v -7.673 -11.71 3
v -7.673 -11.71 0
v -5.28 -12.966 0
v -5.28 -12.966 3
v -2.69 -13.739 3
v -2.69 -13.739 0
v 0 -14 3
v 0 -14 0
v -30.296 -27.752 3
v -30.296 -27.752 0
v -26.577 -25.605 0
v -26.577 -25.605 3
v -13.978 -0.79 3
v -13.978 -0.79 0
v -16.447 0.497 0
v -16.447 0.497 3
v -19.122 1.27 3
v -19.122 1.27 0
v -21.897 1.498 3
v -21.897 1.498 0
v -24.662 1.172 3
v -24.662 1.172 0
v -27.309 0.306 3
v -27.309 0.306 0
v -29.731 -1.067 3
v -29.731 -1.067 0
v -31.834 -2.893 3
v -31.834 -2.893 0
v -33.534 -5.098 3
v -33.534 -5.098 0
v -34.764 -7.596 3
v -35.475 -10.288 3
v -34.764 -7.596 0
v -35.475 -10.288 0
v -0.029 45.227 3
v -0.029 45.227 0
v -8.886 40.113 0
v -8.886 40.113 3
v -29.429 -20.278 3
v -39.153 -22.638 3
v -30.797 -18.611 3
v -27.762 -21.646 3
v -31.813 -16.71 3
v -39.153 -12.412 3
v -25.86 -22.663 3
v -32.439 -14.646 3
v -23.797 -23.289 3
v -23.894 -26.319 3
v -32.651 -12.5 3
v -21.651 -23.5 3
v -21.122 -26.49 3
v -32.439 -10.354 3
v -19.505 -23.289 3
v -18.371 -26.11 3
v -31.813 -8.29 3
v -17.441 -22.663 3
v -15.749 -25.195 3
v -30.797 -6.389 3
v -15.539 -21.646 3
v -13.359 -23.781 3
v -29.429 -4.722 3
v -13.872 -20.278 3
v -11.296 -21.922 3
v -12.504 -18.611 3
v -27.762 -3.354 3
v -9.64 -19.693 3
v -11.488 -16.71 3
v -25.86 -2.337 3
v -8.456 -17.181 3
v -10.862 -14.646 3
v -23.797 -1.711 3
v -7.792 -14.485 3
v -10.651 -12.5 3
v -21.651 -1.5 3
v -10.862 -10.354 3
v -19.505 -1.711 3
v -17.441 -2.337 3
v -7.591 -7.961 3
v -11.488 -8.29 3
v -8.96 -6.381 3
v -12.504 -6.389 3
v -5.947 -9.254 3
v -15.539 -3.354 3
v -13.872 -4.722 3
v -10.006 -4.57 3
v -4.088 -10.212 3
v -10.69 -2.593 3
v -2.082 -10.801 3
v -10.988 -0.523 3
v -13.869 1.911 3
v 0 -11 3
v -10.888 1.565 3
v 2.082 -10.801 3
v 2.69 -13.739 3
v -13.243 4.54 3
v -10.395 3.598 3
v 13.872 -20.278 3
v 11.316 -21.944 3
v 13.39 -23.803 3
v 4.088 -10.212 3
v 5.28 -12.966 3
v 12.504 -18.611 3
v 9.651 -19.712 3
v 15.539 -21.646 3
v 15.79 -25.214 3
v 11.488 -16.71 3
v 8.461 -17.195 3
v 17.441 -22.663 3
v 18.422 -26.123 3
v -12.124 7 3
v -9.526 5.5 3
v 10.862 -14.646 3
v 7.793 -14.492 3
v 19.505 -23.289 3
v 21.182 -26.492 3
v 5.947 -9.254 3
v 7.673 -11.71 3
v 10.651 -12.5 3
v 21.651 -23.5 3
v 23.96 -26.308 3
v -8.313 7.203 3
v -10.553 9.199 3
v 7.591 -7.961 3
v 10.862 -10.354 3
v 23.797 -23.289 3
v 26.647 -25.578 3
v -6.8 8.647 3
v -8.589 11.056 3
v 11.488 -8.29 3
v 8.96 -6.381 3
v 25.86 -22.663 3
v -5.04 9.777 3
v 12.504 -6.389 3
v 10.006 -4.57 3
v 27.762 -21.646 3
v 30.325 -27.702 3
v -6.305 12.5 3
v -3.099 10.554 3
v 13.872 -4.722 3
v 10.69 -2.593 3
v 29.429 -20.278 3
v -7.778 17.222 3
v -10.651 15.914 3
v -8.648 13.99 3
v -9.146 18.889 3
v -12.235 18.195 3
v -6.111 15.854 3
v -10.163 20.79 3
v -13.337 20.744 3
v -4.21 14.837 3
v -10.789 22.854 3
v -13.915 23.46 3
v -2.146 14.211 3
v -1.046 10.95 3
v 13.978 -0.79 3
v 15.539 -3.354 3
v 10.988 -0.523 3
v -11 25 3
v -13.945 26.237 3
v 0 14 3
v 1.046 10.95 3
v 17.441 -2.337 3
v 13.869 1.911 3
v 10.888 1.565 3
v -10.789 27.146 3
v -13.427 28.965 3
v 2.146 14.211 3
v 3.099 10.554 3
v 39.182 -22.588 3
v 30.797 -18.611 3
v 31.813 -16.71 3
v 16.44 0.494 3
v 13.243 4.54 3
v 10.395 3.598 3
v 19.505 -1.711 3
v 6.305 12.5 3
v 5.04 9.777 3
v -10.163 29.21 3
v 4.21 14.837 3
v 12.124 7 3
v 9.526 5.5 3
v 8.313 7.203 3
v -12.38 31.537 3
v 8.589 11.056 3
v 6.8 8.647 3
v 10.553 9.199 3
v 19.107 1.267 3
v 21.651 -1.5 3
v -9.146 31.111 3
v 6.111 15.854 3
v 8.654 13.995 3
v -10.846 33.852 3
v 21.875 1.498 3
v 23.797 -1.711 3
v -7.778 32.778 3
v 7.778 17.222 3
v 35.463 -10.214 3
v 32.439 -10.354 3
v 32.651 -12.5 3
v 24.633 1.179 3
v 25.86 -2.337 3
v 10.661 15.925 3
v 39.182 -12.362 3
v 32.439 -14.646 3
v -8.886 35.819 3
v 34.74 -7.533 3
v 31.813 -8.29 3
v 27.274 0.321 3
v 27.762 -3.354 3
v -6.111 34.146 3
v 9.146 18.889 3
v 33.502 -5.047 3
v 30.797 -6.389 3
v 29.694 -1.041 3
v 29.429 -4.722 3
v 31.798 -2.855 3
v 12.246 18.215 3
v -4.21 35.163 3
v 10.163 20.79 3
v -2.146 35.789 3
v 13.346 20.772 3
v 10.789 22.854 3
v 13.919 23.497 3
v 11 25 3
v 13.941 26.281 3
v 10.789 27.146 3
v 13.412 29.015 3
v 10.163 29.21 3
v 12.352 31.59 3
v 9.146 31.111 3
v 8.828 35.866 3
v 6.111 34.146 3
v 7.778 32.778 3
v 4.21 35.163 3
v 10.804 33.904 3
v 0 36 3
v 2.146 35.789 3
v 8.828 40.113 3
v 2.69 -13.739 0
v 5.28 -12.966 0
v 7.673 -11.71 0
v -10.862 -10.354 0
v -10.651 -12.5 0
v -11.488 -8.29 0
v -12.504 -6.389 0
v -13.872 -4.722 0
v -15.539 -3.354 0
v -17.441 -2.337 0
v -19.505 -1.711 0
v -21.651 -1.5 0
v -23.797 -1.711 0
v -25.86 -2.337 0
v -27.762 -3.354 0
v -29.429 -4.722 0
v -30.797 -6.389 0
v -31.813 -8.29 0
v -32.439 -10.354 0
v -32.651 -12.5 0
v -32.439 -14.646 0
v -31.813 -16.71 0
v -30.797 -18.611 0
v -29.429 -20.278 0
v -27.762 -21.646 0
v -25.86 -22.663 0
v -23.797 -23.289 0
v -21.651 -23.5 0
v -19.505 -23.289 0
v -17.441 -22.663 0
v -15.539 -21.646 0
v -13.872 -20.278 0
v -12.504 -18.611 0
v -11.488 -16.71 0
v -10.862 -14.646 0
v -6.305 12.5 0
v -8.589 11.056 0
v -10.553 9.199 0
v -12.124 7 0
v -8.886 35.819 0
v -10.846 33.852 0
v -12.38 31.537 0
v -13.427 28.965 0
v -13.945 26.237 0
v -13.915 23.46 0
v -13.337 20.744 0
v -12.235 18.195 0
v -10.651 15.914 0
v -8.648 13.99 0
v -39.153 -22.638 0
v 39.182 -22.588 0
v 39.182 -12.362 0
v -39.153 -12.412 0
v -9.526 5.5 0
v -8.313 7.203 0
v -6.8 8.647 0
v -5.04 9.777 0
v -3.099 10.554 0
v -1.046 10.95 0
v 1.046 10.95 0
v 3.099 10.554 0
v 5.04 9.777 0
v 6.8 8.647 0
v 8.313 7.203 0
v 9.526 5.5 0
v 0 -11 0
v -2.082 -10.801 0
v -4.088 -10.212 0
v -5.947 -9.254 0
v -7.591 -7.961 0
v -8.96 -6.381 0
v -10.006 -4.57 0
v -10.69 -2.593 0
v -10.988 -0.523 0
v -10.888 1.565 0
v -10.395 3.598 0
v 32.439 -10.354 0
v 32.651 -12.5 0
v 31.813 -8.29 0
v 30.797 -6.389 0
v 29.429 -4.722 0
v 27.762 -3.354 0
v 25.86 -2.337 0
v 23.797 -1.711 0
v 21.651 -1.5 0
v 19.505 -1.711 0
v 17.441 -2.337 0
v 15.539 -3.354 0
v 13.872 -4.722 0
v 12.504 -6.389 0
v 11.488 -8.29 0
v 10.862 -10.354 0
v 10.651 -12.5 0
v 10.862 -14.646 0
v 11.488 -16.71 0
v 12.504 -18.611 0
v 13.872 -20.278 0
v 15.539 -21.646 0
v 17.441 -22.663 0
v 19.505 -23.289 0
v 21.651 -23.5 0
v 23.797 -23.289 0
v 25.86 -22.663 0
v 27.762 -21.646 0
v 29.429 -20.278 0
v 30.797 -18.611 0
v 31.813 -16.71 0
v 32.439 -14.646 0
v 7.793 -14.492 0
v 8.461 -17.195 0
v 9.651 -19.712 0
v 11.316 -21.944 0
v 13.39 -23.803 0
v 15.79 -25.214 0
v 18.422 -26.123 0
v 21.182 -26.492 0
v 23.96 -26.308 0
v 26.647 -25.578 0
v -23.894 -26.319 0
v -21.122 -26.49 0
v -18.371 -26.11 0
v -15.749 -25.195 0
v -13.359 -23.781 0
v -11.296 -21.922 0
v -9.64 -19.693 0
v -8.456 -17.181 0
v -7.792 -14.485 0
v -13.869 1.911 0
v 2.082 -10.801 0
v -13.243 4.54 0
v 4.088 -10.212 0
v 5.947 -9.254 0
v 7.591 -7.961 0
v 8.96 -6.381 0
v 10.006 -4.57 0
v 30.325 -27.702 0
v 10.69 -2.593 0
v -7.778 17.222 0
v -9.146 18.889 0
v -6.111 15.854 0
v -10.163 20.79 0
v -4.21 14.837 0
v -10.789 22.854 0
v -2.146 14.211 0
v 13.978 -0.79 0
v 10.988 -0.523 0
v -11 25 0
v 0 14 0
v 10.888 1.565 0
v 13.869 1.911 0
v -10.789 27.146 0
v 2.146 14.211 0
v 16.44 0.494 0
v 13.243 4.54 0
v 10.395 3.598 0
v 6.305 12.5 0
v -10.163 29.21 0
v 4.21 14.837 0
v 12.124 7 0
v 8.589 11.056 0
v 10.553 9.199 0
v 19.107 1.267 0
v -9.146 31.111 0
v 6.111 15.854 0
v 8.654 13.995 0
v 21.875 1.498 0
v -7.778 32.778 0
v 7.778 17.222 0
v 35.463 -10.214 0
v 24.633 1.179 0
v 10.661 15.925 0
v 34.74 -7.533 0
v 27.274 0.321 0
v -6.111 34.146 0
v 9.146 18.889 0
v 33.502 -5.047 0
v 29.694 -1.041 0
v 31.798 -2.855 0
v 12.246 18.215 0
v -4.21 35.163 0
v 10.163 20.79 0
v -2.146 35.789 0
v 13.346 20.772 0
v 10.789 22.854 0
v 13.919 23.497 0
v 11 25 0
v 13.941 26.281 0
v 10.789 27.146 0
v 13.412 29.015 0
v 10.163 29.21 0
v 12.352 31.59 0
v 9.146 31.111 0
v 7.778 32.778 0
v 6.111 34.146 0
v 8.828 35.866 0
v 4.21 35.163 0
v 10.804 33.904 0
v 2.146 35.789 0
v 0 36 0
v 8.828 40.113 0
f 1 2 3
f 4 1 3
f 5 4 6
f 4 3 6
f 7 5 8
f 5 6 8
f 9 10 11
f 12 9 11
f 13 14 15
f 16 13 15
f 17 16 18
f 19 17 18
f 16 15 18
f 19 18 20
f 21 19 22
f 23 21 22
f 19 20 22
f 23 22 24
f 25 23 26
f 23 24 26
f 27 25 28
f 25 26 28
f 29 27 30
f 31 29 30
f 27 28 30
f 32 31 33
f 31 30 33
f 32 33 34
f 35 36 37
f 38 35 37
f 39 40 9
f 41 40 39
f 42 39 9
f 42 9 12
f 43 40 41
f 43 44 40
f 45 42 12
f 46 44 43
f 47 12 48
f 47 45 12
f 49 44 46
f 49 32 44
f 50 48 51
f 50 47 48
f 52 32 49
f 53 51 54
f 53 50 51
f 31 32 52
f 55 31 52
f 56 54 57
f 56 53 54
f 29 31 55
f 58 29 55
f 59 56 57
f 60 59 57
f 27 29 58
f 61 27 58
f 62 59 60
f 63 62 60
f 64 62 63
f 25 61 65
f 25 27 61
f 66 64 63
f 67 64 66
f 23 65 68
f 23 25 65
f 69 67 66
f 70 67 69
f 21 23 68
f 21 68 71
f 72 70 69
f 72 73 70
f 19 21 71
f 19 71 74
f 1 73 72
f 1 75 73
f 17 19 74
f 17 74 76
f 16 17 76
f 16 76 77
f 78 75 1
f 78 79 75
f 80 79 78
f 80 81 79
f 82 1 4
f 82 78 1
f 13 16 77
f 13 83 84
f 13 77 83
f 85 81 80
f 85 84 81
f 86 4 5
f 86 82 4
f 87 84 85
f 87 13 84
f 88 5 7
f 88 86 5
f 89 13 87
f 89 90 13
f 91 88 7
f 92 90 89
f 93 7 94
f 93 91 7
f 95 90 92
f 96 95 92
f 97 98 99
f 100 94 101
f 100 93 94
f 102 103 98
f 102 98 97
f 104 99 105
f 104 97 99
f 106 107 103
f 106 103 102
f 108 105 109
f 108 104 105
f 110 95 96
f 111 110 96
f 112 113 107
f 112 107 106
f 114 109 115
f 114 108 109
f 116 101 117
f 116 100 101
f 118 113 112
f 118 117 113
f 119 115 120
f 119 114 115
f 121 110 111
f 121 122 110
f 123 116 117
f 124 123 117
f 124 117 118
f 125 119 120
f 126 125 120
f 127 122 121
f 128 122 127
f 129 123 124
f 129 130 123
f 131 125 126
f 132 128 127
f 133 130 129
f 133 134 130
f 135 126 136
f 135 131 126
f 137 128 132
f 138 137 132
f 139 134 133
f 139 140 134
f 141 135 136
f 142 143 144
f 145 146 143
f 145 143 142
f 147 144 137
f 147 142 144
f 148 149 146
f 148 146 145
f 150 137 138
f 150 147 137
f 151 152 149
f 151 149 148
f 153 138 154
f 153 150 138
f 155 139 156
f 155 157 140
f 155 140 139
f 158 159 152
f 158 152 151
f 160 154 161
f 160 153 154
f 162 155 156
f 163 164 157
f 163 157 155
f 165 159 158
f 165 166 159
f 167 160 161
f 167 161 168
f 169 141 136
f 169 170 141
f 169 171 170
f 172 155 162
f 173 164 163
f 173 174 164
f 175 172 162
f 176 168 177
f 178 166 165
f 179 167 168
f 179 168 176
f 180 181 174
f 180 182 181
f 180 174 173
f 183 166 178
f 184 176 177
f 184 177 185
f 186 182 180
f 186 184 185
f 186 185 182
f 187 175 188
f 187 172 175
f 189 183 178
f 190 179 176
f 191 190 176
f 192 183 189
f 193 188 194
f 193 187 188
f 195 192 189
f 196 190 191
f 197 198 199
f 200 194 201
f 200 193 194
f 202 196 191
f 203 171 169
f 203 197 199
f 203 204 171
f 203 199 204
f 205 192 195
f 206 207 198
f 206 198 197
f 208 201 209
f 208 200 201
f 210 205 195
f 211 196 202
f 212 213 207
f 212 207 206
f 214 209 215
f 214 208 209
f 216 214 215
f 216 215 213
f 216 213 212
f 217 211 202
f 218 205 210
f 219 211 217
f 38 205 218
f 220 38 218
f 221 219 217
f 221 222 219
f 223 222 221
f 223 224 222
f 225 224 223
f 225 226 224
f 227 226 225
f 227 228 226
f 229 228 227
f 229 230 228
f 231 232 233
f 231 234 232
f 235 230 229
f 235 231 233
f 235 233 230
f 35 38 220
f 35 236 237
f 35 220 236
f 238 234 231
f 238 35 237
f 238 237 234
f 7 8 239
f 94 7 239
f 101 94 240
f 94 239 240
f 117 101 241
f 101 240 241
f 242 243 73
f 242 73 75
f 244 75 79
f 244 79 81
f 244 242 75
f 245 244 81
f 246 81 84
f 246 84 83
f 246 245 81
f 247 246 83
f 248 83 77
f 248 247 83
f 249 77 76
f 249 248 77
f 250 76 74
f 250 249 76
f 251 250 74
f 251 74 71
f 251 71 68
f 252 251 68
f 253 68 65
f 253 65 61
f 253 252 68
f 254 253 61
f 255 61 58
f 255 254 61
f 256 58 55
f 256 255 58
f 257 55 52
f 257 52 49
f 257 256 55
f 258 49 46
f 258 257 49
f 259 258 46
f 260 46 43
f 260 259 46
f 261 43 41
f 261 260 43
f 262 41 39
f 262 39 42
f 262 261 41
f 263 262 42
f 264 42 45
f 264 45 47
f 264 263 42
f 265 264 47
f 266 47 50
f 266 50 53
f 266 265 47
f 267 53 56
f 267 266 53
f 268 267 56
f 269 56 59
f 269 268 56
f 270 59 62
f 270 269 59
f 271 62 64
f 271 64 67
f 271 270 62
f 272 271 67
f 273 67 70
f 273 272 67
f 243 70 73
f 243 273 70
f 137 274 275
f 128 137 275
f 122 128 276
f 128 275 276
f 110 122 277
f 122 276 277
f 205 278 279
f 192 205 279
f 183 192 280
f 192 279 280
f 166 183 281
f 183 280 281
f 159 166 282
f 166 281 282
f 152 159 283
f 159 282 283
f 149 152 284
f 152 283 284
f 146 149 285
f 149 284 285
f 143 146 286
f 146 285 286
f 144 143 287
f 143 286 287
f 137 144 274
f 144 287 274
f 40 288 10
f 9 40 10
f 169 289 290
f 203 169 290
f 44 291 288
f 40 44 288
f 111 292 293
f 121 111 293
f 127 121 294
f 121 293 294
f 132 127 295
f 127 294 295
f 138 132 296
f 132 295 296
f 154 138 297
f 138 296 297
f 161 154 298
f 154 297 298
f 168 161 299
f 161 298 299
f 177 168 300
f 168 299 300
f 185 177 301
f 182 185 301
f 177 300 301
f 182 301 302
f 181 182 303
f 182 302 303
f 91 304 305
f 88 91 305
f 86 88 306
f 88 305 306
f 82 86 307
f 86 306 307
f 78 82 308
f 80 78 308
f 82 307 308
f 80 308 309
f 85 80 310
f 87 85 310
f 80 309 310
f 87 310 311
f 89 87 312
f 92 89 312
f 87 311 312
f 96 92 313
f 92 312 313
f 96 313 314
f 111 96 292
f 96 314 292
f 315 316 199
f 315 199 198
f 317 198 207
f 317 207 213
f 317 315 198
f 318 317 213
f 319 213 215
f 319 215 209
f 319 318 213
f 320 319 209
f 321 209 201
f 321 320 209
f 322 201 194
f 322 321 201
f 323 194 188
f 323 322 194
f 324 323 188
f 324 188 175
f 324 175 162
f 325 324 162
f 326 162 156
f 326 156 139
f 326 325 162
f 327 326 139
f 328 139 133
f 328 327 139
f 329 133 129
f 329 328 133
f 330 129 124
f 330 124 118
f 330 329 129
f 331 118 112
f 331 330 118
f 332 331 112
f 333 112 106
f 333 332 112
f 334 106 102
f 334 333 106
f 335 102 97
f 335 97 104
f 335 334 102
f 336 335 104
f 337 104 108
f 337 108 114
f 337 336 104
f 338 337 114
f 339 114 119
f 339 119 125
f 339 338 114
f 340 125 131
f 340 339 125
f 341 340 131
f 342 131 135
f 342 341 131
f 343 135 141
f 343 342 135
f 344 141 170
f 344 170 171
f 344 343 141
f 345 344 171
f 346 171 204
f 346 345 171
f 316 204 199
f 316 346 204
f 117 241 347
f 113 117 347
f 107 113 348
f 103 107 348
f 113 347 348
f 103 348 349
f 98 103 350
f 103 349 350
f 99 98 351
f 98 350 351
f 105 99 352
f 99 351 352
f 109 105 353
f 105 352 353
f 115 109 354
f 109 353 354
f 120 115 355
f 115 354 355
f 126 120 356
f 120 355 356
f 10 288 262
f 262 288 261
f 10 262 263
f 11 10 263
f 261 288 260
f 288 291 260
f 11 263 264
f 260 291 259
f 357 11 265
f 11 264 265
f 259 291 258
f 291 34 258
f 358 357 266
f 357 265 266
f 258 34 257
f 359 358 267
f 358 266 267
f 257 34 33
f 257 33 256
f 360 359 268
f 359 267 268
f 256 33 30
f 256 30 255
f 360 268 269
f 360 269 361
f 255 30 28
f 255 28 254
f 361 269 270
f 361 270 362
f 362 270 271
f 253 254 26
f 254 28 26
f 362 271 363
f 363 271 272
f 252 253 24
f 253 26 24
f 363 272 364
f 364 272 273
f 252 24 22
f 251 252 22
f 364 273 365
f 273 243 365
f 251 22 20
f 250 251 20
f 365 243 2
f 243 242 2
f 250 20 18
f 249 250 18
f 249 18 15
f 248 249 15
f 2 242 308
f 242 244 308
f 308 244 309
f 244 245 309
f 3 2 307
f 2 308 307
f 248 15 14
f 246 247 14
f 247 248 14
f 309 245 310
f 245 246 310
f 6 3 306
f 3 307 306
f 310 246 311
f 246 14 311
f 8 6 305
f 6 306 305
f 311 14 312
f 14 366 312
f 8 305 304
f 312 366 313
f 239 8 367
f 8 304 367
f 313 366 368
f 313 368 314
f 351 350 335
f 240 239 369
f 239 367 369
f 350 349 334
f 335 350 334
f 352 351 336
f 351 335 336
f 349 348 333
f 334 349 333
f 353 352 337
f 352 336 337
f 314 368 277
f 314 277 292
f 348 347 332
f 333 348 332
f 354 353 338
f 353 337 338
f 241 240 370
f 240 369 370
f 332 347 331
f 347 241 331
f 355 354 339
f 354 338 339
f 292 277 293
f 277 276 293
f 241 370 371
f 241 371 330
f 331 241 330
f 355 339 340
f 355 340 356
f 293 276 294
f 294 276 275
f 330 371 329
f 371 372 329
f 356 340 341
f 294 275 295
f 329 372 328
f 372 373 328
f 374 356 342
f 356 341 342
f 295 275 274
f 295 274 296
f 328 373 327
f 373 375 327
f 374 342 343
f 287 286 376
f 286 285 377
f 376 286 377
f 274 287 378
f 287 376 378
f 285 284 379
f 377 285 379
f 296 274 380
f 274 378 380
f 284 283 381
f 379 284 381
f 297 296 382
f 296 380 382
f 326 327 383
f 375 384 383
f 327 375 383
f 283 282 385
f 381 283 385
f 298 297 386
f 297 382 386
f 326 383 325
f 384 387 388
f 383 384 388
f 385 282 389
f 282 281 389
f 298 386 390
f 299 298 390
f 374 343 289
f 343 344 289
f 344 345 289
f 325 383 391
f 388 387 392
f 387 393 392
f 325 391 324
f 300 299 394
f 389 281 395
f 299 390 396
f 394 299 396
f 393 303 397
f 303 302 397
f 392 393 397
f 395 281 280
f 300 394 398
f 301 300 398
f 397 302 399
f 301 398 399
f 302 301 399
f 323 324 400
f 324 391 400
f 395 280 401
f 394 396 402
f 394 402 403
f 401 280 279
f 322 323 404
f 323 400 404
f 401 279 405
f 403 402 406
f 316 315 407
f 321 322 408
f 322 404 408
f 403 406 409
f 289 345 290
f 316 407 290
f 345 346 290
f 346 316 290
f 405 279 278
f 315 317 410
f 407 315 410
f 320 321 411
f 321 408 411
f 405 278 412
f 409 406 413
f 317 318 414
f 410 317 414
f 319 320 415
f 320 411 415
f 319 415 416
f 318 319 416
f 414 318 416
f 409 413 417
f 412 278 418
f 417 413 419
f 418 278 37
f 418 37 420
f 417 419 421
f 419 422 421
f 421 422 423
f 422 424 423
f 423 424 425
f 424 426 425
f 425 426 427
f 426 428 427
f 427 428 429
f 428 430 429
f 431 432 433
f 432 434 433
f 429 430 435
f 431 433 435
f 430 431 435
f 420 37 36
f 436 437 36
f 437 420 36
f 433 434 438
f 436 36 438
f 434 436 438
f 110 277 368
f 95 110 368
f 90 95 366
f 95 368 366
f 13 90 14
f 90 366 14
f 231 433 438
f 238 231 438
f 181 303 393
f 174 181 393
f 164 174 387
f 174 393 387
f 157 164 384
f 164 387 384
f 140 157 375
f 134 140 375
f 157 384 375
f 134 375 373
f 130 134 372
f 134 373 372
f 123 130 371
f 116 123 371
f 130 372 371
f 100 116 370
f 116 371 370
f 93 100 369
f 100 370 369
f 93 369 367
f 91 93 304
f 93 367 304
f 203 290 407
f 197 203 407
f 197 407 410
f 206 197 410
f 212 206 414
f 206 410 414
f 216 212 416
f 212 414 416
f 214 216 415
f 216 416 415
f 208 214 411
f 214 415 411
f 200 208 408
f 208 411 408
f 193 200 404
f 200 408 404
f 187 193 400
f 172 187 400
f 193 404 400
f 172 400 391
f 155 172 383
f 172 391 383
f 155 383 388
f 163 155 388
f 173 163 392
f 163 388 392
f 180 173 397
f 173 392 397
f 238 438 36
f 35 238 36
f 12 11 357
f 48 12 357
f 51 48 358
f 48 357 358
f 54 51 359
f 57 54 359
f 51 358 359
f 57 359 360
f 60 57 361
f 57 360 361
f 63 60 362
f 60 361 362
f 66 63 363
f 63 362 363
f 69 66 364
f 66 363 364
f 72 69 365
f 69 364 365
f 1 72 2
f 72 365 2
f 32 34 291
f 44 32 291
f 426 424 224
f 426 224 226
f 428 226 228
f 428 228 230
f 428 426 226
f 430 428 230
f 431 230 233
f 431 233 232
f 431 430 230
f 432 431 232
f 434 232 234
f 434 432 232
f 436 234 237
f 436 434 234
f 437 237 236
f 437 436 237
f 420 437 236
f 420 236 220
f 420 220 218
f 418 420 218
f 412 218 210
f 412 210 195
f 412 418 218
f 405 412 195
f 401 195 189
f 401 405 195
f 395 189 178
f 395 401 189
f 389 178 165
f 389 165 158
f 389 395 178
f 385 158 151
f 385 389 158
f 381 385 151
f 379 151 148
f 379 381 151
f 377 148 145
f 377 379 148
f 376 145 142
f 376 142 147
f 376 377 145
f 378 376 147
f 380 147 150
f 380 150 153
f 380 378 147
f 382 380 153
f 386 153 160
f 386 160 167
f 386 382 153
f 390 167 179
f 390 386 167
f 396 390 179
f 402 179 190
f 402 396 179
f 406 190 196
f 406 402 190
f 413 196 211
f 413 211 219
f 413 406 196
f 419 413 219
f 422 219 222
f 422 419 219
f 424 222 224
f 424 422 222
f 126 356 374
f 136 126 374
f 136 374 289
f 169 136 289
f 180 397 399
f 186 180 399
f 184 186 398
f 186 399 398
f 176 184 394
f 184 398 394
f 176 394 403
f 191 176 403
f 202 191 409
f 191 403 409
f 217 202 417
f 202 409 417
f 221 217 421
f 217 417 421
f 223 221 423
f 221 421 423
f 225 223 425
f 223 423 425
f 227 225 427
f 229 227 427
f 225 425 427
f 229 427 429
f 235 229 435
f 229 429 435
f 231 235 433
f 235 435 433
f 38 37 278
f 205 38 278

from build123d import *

# Parameters (mm, degrees)
F0_R     = 11
F1_DEPTH = 3


with BuildPart() as f1:
    # F0 (on Top) → F1 (new body)
    with BuildSketch(Plane.XY):
        with BuildLine():
            ThreePointArc((-26.5772530672, -25.6045196536), (-13.359413403, -23.7807642853), (-7.6729374941, -11.710082417))
            ThreePointArc((-7.6729374941, -11.710082417), (-4.0036761959, -13.4153112867), (0, -14))
            ThreePointArc((0, -14), (4.0036761959, -13.4153112867), (7.6729374941, -11.710082417))
            ThreePointArc((7.6729374941, -11.710082417), (13.3895340738, -23.80284079), (26.6470947033, -25.5780499838))
            Line((26.6470947033, -25.5780499838), (30.3253398397, -27.7016858035))
            Line((30.3253398397, -27.7016858035), (39.1819556656, -22.5883162723))
            Line((39.1819556656, -22.5883162723), (39.1819556656, -12.3615772099))
            Line((39.1819556656, -12.3615772099), (35.4627910053, -10.2143164922))
            ThreePointArc((35.4627910053, -10.2143164922), (27.274452694, 0.320790756), (13.9776976005, -0.789917583))
            ThreePointArc((13.9776976005, -0.789917583), (13.6198384719, 3.2403703492), (12.124355653, 7))
            ThreePointArc((12.124355653, 7), (9.616162276, 10.1749409375), (6.3047601065, 12.5))
            ThreePointArc((6.3047601065, 12.5), (13.9190977695, 23.4970970478), (8.8276937136, 35.866085942))
            Line((8.8276937136, 35.866085942), (8.8276937136, 40.1133575813))
            Line((8.8276937136, 40.1133575813), (-0.0289221123, 45.2267271125))
            Line((-0.0289221123, 45.2267271125), (-8.8855379381, 40.1133575813))
            Line((-8.8855379381, 40.1133575813), (-8.8855379381, 35.8188361458))
            ThreePointArc((-8.8855379381, 35.8188361458), (-13.915039291, 23.4599735294), (-6.3047601065, 12.5))
            ThreePointArc((-6.3047601065, 12.5), (-9.616162276, 10.1749409375), (-12.124355653, 7))
            ThreePointArc((-12.124355653, 7), (-13.6198384719, 3.2403703492), (-13.9776976005, -0.789917583))
            ThreePointArc((-13.9776976005, -0.789917583), (-27.3086318433, 0.3057437422), (-35.4747884169, -10.2880359582))
            Line((-35.4747884169, -10.2880359582), (-39.1530335533, -12.4116717778))
            Line((-39.1530335533, -12.4116717778), (-39.1530335533, -22.6384108402))
            Line((-39.1530335533, -22.6384108402), (-30.2964177275, -27.7517803714))
            Line((-30.2964177275, -27.7517803714), (-26.5772530672, -25.6045196536))
        make_face()
        with Locations((-21.6506350946, -12.5)):
            Circle(F0_R, mode=Mode.SUBTRACT)
        with BuildLine():
            ThreePointArc((0, -11), (-9.5262794416, -5.5), (-9.5262794416, 5.5))
            ThreePointArc((-9.5262794416, 5.5), (0, 11), (9.5262794416, 5.5))
            ThreePointArc((9.5262794416, 5.5), (9.5262794416, -5.5), (0, -11))
        make_face(mode=Mode.SUBTRACT)
        with Locations((21.6506350946, -12.5)):
            Circle(F0_R, mode=Mode.SUBTRACT)
        with Locations((0, 25)):
            Circle(F0_R, mode=Mode.SUBTRACT)
    extrude(amount=F1_DEPTH)


solid = f1.part
